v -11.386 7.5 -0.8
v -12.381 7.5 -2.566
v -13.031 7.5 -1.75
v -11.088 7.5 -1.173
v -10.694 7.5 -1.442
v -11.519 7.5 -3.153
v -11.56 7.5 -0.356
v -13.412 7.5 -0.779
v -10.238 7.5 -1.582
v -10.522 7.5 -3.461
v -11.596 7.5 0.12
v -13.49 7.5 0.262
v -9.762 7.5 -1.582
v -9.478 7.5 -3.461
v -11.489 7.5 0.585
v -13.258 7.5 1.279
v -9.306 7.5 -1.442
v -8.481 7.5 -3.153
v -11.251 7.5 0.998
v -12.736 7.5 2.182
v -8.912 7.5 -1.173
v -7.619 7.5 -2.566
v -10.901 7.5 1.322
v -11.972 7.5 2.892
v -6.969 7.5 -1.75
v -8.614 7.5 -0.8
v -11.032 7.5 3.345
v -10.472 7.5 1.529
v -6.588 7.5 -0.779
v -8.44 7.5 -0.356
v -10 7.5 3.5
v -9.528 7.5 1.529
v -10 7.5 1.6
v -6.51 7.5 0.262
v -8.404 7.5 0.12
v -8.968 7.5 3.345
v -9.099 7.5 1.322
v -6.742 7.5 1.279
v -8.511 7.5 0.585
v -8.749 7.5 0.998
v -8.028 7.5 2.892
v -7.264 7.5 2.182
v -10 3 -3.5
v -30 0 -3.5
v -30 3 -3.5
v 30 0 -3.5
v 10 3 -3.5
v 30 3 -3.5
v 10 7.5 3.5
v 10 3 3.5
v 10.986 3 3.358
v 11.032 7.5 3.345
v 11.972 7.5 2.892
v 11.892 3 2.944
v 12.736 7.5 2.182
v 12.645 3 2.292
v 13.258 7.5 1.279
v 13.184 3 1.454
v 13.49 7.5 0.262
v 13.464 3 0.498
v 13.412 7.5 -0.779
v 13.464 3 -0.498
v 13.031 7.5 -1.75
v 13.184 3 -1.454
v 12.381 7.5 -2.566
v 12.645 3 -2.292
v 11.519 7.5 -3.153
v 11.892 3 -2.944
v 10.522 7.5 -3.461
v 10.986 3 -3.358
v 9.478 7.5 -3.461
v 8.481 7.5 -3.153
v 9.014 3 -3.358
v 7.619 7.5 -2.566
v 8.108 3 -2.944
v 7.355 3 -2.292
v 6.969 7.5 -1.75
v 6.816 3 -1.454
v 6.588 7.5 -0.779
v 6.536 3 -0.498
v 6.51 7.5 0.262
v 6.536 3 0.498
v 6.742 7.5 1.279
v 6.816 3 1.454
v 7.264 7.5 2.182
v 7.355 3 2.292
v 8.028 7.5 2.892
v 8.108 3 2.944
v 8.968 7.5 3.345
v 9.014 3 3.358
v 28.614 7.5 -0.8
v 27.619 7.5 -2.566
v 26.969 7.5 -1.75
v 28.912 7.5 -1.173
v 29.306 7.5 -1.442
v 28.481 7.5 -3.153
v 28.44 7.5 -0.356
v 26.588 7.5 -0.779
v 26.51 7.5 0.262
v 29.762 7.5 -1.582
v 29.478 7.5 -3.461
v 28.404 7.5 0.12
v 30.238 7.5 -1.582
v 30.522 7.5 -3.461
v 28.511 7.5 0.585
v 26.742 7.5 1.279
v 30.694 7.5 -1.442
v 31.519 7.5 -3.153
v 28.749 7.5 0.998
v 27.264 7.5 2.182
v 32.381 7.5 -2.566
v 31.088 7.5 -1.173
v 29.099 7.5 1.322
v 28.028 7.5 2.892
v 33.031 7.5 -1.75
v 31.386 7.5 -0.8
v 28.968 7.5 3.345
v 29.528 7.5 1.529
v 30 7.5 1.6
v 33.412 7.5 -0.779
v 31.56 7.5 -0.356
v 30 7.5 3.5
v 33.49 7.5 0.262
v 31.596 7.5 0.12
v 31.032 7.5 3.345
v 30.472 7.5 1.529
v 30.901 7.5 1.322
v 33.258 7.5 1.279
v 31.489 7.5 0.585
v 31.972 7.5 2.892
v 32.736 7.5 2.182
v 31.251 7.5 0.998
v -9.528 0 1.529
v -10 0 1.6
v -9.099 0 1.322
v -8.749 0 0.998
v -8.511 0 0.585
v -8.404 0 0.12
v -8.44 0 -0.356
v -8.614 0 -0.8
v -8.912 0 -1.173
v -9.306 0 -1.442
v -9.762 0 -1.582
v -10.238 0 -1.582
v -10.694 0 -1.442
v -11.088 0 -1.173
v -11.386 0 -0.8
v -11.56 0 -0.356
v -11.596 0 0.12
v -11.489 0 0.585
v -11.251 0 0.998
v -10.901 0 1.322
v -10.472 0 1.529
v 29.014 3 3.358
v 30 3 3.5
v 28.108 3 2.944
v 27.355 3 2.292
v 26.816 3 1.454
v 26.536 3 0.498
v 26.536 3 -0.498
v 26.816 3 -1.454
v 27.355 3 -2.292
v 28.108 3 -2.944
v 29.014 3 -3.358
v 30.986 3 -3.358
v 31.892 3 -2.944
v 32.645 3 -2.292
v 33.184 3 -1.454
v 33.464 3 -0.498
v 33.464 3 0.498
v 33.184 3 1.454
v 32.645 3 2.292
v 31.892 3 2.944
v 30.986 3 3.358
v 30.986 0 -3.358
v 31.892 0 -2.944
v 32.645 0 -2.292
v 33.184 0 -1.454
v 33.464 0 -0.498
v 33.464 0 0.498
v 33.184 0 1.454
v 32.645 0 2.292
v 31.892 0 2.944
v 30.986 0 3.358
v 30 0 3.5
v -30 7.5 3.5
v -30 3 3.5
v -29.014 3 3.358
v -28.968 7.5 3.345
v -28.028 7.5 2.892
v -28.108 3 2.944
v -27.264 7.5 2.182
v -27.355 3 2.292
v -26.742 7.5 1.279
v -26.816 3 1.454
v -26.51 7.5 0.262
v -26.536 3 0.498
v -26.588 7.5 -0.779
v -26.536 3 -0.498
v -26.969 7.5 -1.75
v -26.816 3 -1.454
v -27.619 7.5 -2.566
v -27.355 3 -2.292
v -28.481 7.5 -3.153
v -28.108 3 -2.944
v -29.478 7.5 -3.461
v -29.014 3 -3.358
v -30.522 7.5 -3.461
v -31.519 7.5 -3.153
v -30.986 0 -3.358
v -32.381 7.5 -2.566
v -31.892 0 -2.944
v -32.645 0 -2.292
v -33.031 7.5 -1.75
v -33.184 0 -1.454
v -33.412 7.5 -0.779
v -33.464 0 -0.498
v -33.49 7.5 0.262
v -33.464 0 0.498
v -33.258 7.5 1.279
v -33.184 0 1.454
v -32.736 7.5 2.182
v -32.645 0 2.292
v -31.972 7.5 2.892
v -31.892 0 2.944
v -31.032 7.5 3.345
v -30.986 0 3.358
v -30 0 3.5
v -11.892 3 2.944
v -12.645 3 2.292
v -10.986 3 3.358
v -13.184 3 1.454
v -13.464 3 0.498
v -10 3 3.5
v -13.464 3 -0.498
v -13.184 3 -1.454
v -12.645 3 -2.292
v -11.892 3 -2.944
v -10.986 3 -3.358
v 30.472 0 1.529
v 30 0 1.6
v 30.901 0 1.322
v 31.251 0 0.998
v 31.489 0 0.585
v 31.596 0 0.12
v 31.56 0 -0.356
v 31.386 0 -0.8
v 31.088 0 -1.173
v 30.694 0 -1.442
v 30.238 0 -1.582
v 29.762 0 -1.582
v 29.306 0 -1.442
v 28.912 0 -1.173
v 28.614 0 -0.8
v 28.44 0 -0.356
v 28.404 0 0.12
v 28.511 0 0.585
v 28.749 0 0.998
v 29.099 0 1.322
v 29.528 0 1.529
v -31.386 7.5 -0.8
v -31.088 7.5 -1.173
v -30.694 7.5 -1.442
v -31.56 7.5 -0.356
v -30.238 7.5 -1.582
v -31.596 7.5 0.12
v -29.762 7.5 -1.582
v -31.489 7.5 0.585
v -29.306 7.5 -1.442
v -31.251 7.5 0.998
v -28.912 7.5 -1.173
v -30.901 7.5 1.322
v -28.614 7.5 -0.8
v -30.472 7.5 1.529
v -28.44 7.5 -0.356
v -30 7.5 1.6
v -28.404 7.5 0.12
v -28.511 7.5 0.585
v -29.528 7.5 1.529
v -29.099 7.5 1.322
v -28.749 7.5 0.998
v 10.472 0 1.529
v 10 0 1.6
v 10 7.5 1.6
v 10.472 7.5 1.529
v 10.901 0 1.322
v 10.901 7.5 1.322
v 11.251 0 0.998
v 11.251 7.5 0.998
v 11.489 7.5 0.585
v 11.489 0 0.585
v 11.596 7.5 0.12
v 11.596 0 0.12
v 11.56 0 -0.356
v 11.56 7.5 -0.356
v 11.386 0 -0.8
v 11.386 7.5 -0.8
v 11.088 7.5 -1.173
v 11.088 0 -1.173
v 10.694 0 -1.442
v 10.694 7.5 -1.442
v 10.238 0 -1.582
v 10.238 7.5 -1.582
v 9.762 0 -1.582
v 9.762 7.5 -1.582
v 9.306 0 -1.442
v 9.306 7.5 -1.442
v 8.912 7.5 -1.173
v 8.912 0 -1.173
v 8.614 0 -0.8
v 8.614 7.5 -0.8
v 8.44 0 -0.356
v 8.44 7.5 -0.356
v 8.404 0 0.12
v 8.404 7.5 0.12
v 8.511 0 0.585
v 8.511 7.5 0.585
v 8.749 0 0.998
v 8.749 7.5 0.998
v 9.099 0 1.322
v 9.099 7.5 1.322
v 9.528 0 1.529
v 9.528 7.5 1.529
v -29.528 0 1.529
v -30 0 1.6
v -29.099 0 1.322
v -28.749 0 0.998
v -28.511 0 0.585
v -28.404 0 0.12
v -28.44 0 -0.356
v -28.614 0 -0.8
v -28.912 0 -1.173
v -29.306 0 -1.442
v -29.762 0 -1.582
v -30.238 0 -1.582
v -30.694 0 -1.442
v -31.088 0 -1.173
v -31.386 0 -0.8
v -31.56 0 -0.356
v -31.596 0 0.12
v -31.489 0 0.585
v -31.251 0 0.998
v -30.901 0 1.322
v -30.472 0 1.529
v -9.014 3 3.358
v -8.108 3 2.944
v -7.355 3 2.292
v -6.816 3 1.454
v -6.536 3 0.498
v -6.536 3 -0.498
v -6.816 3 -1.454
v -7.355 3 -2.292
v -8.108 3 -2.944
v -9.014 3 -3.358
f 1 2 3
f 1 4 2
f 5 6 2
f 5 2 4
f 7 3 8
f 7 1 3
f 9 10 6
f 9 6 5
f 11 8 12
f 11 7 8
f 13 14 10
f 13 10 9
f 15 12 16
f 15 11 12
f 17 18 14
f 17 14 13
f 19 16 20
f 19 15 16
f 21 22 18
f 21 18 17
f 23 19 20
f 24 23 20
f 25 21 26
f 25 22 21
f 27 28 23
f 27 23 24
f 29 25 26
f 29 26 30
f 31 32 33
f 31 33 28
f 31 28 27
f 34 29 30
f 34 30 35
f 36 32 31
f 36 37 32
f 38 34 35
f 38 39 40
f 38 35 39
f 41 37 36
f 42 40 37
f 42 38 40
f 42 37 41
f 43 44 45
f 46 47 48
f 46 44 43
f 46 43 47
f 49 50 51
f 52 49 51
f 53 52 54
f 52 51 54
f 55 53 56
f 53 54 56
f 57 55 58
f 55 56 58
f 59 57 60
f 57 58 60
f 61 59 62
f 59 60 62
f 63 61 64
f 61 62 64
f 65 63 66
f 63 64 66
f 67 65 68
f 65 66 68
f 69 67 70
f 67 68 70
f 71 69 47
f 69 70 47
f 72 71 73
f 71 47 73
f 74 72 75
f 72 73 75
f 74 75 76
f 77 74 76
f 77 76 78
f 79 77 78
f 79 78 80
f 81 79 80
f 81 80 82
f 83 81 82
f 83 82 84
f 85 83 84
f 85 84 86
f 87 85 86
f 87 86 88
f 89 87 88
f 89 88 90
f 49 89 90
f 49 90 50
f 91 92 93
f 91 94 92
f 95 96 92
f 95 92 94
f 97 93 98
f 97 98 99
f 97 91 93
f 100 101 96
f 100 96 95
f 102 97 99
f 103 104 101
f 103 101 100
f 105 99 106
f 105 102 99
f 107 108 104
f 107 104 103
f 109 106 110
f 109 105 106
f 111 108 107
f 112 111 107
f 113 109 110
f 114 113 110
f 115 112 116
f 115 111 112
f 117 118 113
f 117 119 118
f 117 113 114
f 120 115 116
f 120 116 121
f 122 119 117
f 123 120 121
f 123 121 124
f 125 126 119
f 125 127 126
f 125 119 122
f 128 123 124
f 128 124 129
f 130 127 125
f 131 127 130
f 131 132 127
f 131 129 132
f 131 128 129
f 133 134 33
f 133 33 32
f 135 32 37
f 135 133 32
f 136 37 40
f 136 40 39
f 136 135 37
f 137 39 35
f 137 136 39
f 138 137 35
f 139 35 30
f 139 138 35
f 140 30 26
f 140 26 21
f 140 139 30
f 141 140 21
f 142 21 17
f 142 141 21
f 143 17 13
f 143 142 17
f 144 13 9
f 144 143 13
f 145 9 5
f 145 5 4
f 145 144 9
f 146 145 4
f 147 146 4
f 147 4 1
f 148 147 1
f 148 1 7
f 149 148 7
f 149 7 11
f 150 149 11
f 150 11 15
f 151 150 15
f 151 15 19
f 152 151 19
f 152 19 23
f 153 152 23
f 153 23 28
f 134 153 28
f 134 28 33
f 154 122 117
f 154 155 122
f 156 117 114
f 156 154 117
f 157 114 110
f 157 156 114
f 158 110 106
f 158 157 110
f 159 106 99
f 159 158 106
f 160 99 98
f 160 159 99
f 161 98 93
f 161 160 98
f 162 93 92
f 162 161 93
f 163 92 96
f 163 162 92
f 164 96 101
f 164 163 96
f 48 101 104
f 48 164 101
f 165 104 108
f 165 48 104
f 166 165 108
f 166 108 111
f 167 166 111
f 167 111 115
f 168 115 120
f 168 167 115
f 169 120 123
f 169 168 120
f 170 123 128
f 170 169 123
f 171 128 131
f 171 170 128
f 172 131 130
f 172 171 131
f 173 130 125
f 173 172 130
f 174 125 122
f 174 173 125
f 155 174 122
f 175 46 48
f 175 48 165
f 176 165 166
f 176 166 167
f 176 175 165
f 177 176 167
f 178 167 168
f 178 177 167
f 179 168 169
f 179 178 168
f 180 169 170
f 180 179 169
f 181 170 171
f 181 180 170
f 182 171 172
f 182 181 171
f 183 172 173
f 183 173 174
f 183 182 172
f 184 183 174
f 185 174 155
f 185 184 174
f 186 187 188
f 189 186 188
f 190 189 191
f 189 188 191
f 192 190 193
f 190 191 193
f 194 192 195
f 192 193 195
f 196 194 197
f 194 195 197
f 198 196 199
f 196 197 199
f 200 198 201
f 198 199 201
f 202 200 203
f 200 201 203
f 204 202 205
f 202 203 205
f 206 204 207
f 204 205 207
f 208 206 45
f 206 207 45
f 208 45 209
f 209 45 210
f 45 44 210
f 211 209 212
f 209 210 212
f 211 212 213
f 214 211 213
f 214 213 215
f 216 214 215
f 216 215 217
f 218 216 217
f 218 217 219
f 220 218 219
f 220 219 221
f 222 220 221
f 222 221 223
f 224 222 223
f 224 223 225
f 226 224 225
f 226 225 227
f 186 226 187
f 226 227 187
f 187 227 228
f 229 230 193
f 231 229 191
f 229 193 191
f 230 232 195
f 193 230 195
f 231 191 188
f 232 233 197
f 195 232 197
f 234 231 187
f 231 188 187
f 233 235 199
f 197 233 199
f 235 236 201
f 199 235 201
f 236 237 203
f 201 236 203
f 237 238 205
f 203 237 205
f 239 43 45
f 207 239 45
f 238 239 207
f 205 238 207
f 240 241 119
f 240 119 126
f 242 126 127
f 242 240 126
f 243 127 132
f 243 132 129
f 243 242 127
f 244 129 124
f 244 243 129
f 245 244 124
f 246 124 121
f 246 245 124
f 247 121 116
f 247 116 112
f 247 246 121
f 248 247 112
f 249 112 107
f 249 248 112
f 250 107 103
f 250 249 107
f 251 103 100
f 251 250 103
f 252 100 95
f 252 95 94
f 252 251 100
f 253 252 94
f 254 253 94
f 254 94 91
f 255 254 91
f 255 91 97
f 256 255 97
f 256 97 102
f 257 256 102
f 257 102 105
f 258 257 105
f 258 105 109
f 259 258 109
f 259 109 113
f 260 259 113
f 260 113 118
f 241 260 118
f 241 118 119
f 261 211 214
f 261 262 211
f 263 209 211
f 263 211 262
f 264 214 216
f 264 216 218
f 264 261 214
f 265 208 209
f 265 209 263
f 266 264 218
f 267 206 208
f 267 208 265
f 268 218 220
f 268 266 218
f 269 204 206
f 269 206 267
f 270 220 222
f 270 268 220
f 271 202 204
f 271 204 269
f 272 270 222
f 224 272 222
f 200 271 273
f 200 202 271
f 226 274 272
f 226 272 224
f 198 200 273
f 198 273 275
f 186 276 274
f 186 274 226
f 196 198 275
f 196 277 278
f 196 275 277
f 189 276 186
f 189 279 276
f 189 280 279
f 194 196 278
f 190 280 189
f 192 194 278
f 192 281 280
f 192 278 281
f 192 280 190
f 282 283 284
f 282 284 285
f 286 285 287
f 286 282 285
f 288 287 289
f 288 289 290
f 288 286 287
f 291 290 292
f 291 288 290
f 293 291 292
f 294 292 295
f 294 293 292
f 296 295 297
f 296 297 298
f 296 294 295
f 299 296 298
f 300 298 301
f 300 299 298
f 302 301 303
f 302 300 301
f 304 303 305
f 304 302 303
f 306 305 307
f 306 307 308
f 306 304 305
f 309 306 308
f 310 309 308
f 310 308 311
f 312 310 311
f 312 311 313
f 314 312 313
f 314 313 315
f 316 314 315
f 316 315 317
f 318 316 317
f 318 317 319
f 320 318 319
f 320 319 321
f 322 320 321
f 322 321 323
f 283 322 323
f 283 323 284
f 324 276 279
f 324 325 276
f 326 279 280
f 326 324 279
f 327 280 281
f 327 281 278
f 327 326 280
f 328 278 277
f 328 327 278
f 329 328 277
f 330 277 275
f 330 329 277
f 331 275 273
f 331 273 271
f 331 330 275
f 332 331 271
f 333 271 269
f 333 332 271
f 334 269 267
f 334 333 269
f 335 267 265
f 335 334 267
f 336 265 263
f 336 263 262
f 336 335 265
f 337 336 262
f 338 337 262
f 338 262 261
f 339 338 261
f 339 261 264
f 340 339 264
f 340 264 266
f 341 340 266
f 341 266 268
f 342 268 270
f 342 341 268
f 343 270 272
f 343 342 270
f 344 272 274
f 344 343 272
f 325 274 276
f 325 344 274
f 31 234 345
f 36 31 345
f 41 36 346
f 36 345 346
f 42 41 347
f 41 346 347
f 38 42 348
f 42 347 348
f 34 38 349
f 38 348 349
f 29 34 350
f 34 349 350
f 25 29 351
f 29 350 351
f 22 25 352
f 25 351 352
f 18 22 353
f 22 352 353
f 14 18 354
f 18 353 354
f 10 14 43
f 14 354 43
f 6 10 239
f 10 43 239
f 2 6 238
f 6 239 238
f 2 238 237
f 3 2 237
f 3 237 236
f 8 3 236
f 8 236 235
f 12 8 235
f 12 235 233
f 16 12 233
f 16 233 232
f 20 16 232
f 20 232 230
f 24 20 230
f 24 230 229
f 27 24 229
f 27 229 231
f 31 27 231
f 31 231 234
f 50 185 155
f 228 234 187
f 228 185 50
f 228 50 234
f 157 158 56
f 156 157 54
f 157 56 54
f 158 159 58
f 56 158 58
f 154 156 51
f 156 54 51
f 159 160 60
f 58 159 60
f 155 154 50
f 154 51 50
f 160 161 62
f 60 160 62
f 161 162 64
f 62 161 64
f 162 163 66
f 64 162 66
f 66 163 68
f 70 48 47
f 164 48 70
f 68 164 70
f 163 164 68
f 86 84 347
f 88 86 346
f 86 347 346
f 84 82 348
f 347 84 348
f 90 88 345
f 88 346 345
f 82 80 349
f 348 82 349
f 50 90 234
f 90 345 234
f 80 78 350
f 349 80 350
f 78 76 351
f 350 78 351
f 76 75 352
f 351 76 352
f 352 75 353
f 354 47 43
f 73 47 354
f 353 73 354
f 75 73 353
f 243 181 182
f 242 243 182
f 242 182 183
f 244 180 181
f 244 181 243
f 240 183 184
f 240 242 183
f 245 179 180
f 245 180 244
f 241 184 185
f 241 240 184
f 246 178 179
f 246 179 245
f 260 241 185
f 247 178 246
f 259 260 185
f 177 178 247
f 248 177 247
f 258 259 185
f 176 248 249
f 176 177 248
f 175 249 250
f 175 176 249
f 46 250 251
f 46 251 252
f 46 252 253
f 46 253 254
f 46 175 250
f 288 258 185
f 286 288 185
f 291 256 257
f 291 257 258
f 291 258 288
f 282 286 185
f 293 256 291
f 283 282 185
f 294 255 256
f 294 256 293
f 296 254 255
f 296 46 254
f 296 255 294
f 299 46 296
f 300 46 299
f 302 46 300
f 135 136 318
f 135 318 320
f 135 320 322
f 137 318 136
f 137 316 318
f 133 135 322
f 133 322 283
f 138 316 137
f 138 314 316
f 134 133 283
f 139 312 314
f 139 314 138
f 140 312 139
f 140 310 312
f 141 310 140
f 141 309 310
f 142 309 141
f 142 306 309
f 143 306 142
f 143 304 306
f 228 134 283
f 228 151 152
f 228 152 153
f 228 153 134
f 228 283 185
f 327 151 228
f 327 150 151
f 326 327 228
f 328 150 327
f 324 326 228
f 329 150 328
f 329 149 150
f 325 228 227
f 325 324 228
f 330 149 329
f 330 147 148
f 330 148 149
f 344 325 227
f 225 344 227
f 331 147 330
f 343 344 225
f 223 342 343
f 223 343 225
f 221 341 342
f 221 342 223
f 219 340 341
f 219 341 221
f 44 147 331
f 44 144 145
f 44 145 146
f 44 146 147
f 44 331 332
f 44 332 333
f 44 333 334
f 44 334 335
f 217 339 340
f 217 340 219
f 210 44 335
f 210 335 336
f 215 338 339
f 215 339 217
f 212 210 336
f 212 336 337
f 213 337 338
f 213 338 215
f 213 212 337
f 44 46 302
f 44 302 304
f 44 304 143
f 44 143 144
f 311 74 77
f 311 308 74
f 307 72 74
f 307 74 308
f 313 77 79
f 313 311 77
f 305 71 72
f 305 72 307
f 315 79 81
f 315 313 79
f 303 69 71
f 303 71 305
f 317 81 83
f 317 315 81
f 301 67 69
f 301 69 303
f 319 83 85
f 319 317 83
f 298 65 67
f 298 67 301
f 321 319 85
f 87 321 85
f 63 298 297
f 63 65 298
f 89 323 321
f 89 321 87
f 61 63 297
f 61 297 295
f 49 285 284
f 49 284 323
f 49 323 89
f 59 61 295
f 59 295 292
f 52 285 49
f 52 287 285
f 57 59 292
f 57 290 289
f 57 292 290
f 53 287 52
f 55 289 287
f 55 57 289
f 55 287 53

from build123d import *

# Parameters (mm, degrees)
SKETCH1_R           = 1.6
BOSS_EXTRUDE1_DEPTH = 3
SKETCH2_R           = 3.5
SKETCH2_R_2         = 1.6
BOSS_EXTRUDE2_DEPTH = 4.5


with BuildPart() as part:
    # Sketch1 → Boss-Extrude1 (new body)
    with BuildSketch(Plane(origin=(0, 0, 0), x_dir=(1, 0, 0), z_dir=(0, 1, 0))):
        with BuildLine():
            Line((30, -3.5), (-30, -3.5))
            ThreePointArc((-30, -3.5), (-33.5, 0), (-30, 3.5))
            Line((-30, 3.5), (30, 3.5))
            ThreePointArc((30, 3.5), (33.5, 0), (30, -3.5))
        make_face()
        with Locations(Location((-30, 0, 0), (0, 0, 270))):
            Circle(SKETCH1_R, mode=Mode.SUBTRACT)
        with Locations(Location((-10, 0, 0), (0, 0, 270))):
            Circle(SKETCH1_R, mode=Mode.SUBTRACT)
        with Locations(Location((10, 0, 0), (0, 0, 270))):
            Circle(SKETCH1_R, mode=Mode.SUBTRACT)
        with Locations(Location((30, 0, 0), (0, 0, 270))):
            Circle(SKETCH1_R, mode=Mode.SUBTRACT)
    extrude(amount=BOSS_EXTRUDE1_DEPTH)

    # Sketch2 → Boss-Extrude2 (add)
    # profile 1 of 4: a face of its own
    with BuildSketch(Plane(origin=(0, 3, 0), x_dir=(1, 0, 0), z_dir=(0, 1, 0))):
        with Locations(Location((-30, 0, 0), (0, 0, 270))):
            Circle(SKETCH2_R)
        with Locations(Location((-30, 0, 0), (0, 0, 270))):
            Circle(SKETCH2_R_2, mode=Mode.SUBTRACT)
    # profile 2 of 4: a face of its own
    with BuildSketch(Plane(origin=(0, 3, 0), x_dir=(1, 0, 0), z_dir=(0, 1, 0))):
        with Locations(Location((-10, 0, 0), (0, 0, 270))):
            Circle(SKETCH2_R)
        with Locations(Location((-10, 0, 0), (0, 0, 270))):
            Circle(SKETCH2_R_2, mode=Mode.SUBTRACT)
    # profile 3 of 4: a face of its own
    with BuildSketch(Plane(origin=(0, 3, 0), x_dir=(1, 0, 0), z_dir=(0, 1, 0))):
        with Locations(Location((10, 0, 0), (0, 0, 270))):
            Circle(SKETCH2_R)
        with Locations(Location((10, 0, 0), (0, 0, 270))):
            Circle(SKETCH2_R_2, mode=Mode.SUBTRACT)
    # profile 4 of 4: a face of its own
    with BuildSketch(Plane(origin=(0, 3, 0), x_dir=(1, 0, 0), z_dir=(0, 1, 0))):
        with Locations(Location((30, 0, 0), (0, 0, 270))):
            Circle(SKETCH2_R)
        with Locations(Location((30, 0, 0), (0, 0, 270))):
            Circle(SKETCH2_R_2, mode=Mode.SUBTRACT)
    extrude(amount=BOSS_EXTRUDE2_DEPTH)


solid = part.part
